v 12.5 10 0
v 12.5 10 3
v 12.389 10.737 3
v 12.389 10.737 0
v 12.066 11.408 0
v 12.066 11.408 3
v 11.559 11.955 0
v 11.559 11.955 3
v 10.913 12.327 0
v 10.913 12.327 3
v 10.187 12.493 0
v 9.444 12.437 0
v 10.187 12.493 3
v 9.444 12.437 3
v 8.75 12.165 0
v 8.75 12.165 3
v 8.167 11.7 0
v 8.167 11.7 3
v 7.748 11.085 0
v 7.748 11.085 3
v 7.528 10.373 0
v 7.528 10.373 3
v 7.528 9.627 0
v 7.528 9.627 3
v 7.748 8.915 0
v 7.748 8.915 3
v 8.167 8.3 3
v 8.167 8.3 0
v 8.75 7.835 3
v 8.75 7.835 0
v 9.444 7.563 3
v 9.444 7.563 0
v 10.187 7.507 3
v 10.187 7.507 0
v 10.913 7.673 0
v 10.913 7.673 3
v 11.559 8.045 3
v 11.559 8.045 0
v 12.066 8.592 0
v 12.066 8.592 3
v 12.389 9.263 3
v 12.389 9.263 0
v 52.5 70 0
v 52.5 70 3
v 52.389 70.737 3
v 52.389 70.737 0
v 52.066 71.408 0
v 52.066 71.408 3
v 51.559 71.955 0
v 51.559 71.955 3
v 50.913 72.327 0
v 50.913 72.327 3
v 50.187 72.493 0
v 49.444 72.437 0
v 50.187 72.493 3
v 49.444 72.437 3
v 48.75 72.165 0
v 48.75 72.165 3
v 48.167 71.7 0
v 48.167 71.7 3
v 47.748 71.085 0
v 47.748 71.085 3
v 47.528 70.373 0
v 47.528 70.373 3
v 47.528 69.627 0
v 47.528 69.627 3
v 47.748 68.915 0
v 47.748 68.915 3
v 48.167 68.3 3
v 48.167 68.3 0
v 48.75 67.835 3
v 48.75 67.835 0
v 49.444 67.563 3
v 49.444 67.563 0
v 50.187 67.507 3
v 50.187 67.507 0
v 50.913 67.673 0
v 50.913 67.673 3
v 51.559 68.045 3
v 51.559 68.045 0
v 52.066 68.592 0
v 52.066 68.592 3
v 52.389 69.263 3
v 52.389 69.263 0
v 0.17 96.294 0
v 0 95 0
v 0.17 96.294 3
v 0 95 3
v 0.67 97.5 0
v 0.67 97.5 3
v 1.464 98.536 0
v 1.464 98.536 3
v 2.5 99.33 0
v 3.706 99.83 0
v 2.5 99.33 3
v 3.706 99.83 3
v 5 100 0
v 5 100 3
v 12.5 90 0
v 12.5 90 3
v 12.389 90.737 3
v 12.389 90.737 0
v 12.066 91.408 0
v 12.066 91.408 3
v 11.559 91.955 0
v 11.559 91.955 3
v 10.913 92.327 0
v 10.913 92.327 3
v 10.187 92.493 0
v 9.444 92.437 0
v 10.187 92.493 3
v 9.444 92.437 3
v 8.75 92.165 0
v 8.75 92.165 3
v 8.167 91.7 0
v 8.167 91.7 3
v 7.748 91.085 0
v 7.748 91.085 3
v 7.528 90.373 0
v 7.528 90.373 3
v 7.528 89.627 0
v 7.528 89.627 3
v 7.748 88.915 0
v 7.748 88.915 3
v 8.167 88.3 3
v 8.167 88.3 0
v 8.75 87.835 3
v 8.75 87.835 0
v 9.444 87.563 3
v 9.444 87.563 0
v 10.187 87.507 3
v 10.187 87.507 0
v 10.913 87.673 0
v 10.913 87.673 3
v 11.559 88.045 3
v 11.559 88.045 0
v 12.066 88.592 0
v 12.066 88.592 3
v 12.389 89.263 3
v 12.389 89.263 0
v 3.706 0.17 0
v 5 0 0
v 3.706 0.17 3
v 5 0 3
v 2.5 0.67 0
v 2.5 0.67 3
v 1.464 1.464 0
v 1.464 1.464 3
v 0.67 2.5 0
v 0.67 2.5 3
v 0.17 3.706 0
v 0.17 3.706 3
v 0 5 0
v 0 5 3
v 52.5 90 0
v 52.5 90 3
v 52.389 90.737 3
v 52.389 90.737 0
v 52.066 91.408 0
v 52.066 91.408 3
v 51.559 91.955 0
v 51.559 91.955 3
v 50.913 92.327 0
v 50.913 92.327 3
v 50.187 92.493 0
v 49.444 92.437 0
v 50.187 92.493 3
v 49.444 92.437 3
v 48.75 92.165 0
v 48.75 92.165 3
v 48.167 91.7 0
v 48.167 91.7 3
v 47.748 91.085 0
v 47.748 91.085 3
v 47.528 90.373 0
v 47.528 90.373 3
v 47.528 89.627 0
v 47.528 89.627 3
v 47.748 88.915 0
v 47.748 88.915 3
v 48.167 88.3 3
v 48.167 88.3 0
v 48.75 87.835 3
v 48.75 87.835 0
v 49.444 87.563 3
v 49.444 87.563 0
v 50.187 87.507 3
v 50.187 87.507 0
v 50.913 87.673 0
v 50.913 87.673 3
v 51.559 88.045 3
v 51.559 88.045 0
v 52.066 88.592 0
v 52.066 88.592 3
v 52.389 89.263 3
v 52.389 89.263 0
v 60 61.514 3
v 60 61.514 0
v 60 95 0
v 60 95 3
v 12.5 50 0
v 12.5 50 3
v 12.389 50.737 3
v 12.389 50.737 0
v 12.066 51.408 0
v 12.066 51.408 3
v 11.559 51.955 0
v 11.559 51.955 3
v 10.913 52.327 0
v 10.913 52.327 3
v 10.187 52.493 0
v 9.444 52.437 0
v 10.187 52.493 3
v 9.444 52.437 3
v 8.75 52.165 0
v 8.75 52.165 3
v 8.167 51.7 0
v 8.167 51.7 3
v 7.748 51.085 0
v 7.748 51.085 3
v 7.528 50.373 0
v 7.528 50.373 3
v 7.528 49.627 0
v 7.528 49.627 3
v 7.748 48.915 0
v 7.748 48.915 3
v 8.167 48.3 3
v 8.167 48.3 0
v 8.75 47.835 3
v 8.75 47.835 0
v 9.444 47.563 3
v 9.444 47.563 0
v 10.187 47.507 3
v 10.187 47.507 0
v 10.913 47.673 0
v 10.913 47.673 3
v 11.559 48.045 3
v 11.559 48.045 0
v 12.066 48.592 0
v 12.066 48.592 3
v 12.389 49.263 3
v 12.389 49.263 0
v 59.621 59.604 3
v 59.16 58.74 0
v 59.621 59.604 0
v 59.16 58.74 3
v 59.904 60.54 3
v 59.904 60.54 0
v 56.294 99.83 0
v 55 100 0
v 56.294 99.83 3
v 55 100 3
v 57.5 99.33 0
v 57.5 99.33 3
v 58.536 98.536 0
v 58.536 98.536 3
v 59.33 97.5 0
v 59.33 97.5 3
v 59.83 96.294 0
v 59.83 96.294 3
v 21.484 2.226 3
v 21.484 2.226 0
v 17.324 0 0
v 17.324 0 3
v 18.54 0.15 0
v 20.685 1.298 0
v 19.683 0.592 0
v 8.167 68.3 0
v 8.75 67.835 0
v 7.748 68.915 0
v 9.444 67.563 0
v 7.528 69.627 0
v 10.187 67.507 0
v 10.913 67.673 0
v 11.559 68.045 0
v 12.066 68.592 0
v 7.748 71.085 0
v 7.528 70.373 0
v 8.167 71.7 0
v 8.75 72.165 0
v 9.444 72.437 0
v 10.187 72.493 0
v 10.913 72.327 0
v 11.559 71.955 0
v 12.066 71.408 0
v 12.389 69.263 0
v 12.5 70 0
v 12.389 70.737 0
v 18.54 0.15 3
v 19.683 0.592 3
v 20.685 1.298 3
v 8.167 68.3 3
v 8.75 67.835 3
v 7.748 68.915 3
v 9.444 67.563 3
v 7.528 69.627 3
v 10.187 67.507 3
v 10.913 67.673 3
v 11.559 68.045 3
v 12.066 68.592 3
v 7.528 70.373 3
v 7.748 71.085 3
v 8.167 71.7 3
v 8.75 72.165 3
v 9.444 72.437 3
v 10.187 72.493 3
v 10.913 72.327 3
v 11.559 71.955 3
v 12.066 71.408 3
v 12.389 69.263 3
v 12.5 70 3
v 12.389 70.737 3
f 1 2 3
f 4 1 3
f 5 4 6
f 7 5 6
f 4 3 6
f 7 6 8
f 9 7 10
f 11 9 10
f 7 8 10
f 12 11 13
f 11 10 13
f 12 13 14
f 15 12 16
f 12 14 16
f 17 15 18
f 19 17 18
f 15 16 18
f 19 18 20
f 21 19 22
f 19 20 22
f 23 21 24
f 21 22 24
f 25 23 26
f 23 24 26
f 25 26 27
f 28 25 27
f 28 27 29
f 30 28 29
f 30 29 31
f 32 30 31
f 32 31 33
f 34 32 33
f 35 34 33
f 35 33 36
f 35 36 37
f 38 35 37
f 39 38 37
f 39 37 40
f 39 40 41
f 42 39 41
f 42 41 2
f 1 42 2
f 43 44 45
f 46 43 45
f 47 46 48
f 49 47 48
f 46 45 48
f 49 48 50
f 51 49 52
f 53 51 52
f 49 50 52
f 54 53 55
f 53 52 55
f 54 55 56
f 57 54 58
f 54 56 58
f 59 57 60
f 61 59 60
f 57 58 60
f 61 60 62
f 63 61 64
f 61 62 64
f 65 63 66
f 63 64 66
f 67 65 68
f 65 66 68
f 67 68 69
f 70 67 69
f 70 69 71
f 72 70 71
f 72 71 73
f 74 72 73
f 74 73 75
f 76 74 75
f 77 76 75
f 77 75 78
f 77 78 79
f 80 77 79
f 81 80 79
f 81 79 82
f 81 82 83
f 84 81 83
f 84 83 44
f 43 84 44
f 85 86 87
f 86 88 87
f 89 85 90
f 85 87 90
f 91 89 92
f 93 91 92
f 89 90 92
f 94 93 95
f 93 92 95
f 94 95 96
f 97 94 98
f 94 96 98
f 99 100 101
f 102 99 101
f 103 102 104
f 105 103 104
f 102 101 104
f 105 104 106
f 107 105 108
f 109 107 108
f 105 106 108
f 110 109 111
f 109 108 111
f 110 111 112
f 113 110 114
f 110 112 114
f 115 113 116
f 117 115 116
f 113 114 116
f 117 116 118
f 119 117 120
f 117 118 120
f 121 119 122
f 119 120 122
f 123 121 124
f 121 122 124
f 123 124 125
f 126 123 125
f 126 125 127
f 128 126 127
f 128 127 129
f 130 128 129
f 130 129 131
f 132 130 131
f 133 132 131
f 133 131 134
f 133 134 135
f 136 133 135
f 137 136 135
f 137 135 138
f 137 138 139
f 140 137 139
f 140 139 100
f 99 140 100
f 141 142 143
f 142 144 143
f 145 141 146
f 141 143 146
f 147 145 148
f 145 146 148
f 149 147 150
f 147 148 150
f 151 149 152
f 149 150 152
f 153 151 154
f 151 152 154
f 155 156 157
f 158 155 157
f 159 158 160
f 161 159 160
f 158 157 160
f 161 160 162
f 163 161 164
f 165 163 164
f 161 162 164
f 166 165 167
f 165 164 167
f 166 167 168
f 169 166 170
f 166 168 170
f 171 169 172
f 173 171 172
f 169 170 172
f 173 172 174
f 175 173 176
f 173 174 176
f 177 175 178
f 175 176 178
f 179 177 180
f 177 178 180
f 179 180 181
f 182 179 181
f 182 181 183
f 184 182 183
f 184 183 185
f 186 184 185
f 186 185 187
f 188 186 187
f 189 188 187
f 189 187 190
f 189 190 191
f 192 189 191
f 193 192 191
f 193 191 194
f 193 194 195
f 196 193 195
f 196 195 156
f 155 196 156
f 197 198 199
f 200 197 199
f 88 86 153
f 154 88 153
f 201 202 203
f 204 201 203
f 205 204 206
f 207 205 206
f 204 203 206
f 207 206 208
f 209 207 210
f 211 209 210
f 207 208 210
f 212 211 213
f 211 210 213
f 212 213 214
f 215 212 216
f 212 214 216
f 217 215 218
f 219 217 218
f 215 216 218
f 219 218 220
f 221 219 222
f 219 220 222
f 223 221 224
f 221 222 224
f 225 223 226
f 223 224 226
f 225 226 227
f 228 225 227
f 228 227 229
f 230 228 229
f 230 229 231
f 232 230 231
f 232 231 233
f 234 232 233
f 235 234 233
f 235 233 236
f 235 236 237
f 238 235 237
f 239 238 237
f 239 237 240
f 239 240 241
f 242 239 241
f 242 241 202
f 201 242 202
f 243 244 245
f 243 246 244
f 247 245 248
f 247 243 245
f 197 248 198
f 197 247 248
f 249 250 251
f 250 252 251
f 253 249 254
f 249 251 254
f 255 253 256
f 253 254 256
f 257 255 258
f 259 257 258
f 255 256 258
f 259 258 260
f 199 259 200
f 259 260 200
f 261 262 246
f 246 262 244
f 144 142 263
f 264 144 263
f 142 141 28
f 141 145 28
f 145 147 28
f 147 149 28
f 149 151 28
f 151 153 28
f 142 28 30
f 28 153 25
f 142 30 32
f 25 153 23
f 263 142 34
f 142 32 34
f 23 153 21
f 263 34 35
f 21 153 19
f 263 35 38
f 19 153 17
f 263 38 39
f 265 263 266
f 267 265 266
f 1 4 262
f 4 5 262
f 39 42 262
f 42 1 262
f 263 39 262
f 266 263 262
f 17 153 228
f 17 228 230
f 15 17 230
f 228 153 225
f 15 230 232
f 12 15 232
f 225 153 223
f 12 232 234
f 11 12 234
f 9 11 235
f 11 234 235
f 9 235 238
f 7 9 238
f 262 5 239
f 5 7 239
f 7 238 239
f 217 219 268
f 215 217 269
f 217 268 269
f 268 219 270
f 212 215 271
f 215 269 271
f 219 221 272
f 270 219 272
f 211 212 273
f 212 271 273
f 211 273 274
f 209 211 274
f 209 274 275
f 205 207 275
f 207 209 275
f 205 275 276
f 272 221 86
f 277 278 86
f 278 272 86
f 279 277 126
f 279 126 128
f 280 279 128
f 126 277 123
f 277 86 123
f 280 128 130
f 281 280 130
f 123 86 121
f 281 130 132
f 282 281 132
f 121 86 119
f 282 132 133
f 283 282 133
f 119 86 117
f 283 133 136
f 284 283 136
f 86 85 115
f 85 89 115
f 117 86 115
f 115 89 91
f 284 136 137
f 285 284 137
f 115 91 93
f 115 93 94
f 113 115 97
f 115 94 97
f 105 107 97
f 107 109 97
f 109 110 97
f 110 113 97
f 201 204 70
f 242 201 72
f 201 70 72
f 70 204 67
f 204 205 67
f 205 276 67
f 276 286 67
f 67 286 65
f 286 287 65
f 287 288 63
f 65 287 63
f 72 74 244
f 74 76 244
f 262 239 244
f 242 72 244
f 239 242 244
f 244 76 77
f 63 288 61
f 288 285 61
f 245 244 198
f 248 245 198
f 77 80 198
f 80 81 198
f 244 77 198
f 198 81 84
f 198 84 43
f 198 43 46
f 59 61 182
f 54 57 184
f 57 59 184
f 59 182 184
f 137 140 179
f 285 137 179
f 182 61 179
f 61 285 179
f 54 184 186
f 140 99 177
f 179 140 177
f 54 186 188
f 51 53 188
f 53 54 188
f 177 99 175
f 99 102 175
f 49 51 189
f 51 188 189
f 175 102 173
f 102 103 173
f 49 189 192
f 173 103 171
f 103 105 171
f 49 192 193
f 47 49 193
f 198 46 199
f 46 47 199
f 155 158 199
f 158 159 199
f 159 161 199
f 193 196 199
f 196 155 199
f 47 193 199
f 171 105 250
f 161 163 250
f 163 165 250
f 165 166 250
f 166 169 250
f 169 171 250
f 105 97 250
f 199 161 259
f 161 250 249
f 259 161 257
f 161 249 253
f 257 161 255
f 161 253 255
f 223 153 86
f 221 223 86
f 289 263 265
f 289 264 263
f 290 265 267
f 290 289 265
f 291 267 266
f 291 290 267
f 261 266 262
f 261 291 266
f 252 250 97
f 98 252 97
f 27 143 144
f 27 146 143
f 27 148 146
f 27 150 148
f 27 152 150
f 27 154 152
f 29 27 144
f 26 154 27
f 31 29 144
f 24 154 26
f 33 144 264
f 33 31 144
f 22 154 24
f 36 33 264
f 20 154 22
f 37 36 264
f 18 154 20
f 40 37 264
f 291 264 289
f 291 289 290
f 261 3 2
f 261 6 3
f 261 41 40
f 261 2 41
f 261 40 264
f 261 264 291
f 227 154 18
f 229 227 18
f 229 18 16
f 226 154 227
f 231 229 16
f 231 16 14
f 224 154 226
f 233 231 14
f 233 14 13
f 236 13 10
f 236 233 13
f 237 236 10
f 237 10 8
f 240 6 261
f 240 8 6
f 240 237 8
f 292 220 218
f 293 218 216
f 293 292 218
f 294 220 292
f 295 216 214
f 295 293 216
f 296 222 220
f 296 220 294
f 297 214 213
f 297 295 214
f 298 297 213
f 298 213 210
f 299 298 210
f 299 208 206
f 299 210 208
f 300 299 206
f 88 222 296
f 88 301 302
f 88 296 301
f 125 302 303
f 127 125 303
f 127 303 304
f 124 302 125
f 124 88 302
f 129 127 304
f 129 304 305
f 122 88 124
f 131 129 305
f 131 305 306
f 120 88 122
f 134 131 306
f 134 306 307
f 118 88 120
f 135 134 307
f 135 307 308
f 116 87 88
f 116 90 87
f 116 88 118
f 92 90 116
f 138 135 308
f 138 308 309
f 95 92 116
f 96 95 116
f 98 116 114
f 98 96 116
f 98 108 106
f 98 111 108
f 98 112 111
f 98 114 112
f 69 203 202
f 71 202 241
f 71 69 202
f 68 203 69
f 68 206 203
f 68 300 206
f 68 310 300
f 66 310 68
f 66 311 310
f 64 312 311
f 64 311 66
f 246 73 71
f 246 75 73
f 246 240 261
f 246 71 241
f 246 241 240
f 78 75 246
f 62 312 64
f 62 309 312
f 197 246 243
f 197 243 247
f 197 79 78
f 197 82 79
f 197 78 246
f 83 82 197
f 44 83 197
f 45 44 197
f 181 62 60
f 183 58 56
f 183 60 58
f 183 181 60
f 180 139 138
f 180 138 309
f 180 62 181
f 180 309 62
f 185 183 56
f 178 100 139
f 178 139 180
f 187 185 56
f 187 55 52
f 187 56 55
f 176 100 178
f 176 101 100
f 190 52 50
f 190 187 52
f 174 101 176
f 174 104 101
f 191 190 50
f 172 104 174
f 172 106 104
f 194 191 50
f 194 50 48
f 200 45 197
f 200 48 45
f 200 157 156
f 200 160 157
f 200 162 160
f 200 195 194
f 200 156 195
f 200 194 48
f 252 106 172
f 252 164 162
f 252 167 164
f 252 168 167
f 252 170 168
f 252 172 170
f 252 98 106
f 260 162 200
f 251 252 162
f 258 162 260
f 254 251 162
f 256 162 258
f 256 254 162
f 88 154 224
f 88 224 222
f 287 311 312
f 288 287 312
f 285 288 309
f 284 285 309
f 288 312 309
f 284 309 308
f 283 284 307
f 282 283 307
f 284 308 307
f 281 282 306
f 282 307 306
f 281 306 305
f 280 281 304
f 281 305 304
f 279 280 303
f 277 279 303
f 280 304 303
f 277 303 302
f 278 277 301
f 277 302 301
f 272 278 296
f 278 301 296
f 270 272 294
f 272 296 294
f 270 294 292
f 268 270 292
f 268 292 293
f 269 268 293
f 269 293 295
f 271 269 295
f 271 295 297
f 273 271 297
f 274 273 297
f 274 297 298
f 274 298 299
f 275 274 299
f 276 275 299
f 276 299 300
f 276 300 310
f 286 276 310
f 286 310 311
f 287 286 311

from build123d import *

# Parameters (mm, degrees)
BOSS_EXTRUDE1_DEPTH  = 3
SKETCH3_R            = 2.5
CUT_EXTRUDE1_DEPTH   = 4
LPATTERN1_COUNT      = 2
LPATTERN1_PITCH      = 40
LPATTERN1_COUNT_DIR2 = 2
LPATTERN1_PITCH_DIR2 = 20
SKETCH4_R            = 2.5
CUT_EXTRUDE2_DEPTH   = 4
LPATTERN2_COUNT      = 2
LPATTERN2_PITCH      = 40
FILLET1_R            = 5


with BuildPart() as part:
    # Sketch1 → Boss-Extrude1 (new body)
    with BuildSketch(Plane.XY):
        Polygon((0, 0), (20, 0), (60, 60), (60, 100), (0, 100), align=None)
    extrude(amount=BOSS_EXTRUDE1_DEPTH)

    # Sketch3 → Cut-Extrude1 (cut, through all)
    with BuildSketch(Plane.XY.offset(3)):
        with Locations((50, 90)):
            Circle(SKETCH3_R)
    cut_extrude1 = extrude(amount=-CUT_EXTRUDE1_DEPTH, mode=Mode.SUBTRACT)

    # LPattern1: Cut-Extrude1 2 × 2
    with Locations(*[(-i * LPATTERN1_PITCH, -j * LPATTERN1_PITCH_DIR2, 0) for i in range(LPATTERN1_COUNT) for j in range(LPATTERN1_COUNT_DIR2) if (i, j) != (0, 0)]):
        add(cut_extrude1, mode=Mode.SUBTRACT)

    # Sketch4 → Cut-Extrude2 (cut, through all)
    with BuildSketch(Plane.XY.offset(3)):
        with Locations((10, 10)):
            Circle(SKETCH4_R)
    cut_extrude2 = extrude(amount=-CUT_EXTRUDE2_DEPTH, mode=Mode.SUBTRACT)

    # LPattern2: Cut-Extrude2 ×2
    with Locations(*[(0, i * LPATTERN2_PITCH, 0) for i in range(1, LPATTERN2_COUNT)]):
        add(cut_extrude2, mode=Mode.SUBTRACT)

    # Fillet1
    fillet1_edges = [part.edges().sort_by_distance(p)[0] for p in [
        (0, 100, 1.5),
        (60, 100, 1.5),
        (60, 60, 1.5),
        (20, 0, 1.5),
        (0, 0, 1.5),
    ]]
    fillet(fillet1_edges, radius=FILLET1_R)


solid = part.part
